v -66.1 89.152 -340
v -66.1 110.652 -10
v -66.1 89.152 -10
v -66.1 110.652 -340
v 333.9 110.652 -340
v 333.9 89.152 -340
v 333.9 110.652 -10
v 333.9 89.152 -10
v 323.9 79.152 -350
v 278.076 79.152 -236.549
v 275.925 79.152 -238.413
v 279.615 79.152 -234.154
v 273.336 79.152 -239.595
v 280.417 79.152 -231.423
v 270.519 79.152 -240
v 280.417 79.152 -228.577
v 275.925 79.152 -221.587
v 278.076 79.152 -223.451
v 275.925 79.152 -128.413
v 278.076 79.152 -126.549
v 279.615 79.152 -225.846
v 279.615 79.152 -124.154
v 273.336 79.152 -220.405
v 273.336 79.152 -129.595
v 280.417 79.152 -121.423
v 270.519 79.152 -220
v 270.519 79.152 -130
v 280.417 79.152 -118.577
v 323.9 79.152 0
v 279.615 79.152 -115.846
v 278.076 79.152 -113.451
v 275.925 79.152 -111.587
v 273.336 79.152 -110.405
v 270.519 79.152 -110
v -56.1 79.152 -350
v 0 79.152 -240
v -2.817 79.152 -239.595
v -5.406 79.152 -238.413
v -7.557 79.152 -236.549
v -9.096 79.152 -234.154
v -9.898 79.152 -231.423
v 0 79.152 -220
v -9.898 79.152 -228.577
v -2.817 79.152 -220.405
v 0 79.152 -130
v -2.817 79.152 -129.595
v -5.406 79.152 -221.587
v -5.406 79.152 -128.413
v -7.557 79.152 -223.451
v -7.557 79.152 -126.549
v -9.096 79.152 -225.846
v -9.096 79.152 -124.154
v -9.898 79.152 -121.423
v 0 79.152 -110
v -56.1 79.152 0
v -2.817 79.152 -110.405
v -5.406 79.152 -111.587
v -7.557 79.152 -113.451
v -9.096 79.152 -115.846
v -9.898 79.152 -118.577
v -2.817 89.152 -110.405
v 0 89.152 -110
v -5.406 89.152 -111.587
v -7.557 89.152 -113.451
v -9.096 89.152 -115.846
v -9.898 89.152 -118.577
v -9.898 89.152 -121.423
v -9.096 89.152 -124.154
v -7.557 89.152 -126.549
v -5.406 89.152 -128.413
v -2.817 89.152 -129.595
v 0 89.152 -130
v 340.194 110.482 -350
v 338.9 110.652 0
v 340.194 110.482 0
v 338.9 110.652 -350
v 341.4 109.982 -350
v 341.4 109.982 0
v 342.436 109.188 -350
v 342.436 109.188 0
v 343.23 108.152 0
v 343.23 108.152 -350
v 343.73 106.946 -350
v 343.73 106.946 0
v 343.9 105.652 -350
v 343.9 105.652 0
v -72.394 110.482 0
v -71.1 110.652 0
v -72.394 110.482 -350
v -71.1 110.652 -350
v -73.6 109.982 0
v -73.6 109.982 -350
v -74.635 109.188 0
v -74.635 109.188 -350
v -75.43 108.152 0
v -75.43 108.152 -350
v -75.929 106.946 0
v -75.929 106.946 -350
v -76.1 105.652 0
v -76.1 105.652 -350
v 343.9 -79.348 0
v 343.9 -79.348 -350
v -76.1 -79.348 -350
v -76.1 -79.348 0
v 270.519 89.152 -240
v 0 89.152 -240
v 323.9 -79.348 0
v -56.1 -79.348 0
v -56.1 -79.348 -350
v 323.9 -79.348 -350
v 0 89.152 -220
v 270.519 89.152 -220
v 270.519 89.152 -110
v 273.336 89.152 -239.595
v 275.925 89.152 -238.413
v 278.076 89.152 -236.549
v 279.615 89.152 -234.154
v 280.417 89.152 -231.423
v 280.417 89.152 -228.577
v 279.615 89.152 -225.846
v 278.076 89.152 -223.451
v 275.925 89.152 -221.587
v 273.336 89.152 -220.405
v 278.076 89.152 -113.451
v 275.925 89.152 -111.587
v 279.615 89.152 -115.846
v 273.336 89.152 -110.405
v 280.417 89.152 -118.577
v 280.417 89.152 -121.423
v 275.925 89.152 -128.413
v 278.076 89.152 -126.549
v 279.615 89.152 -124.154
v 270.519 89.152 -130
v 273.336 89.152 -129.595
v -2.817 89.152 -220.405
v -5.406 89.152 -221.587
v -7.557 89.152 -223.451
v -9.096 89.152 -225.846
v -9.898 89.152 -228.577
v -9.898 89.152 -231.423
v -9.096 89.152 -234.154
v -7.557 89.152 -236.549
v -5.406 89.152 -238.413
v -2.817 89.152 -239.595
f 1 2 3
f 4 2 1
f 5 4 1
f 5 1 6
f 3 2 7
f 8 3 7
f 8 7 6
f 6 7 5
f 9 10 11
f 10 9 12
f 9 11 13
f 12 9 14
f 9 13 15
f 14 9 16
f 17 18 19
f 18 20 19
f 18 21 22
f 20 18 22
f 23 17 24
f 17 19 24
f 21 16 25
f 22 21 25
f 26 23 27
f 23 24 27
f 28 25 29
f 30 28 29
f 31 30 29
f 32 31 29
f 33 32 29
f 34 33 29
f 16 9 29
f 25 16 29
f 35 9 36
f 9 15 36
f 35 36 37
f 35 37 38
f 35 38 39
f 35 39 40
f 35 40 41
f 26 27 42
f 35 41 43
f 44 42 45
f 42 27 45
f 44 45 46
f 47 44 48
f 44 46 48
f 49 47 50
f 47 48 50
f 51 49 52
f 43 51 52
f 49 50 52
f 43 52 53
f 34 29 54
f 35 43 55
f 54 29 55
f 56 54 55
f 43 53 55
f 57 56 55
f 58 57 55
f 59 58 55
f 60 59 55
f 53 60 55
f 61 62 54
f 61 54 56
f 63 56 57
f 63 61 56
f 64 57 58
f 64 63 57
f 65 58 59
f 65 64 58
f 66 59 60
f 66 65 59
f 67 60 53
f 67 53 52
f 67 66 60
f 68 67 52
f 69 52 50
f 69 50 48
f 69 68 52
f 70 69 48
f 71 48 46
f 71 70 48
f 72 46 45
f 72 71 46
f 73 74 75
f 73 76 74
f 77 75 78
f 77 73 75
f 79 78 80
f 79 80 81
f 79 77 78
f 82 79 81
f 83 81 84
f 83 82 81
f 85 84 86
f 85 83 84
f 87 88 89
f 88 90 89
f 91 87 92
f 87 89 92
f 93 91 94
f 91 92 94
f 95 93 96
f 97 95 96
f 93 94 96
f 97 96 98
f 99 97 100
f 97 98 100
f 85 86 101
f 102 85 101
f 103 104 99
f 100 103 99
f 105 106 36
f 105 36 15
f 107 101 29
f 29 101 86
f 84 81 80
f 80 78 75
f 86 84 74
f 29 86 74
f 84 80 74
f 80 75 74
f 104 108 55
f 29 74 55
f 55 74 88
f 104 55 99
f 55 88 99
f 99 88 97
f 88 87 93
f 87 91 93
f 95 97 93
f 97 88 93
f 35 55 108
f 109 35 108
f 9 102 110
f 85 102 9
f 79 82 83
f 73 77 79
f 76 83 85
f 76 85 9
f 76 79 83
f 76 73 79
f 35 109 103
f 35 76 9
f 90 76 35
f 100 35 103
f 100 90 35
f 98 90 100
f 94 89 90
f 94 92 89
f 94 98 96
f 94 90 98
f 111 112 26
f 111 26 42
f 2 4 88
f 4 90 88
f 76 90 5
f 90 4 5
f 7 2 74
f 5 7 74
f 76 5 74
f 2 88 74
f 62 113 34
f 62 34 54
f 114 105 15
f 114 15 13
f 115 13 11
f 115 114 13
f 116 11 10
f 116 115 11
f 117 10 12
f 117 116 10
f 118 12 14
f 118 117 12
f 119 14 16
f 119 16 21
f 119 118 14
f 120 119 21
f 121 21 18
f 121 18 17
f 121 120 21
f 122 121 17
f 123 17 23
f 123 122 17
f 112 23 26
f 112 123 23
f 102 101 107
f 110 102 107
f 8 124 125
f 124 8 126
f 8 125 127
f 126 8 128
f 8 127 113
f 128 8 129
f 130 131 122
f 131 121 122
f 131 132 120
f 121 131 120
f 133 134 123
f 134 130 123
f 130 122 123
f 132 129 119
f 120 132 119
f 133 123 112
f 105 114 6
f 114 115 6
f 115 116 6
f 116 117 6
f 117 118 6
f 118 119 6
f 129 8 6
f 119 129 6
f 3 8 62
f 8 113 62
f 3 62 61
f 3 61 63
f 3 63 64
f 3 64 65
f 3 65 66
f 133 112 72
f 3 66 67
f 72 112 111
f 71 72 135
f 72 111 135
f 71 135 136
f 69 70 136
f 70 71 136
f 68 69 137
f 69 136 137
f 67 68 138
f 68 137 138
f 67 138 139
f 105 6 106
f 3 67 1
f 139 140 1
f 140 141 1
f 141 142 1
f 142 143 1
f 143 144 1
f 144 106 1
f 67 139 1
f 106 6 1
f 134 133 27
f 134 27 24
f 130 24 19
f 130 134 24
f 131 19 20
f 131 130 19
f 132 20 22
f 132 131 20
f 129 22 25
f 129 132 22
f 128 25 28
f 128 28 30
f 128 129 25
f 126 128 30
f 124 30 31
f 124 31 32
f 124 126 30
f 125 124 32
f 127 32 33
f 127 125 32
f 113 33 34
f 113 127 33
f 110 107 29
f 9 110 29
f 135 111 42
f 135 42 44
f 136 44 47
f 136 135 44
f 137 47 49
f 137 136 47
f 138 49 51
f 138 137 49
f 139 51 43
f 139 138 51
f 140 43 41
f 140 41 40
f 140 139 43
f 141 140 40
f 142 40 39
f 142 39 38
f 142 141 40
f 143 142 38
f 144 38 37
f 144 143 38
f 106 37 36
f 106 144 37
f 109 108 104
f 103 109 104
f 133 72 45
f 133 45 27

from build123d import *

# Parameters (mm, degrees)
BOSS_EXTRUDE1_DEPTH  = 350
SKETCH4_W            = 400
SKETCH4_H            = 330
CUT_EXTRUDE1_DEPTH   = 21.5
SKETCH5_W            = 130
SKETCH5_H            = 130
CUT_EXTRUDE2_DEPTH   = 30
FILLET1_R            = 5
SKETCH15_W           = 130
SKETCH15_H           = 10
CUT_EXTRUDE3_DEPTH   = 25
SKETCH16_W           = 130
SKETCH16_H           = 10
BOSS_EXTRUDE6_DEPTH  = 25
SKETCH22_W           = 130
SKETCH22_H           = 130
BOSS_EXTRUDE11_DEPTH = 10
BOSS_EXTRUDE12_DEPTH = 10
CUT_EXTRUDE4_DEPTH   = 10


with BuildPart() as part:
    # Sketch3 → Boss-Extrude1 (new body)
    with BuildSketch(Plane.XY):
        Polygon((-76.099744246, 110.652173913), (343.900255754, 110.652173913), (343.900255754, -79.347826087), (323.900255754, -79.347826087), (323.900255754, 79.152173913), (-56.099744246, 79.152173913), (-56.099744246, -79.347826087), (-76.099744246, -79.347826087), align=None)
    extrude(amount=-BOSS_EXTRUDE1_DEPTH)

    # Sketch4 → Cut-Extrude1 (cut)
    with BuildSketch(Plane(origin=(0, 110.652173913, 0), x_dir=(1, 0, 0), z_dir=(0, 1, 0))):
        with Locations((133.900255754, 175)):
            Rectangle(SKETCH4_W, SKETCH4_H)
    extrude(amount=-CUT_EXTRUDE1_DEPTH, mode=Mode.SUBTRACT)

    # Sketch5 → Cut-Extrude2 (cut)
    with BuildSketch(Plane(origin=(0, 89.152173913, 0), x_dir=(1, 0, 0), z_dir=(0, 1, 0))):
        with Locations((33.900255754, 110)):
            Rectangle(SKETCH5_W, SKETCH5_H)
        with BuildLine():
            Line((-21.099744246, 247.552781264), (88.900255754, 247.552781264))
            ThreePointArc((88.900255754, 247.552781264), (98.900255754, 237.552781264), (88.900255754, 227.552781264))
            Line((88.900255754, 227.552781264), (-21.099744246, 227.552781264))
            ThreePointArc((-21.099744246, 227.552781264), (-31.099744246, 237.552781264), (-21.099744246, 247.552781264))
        make_face()
        with BuildLine():
            Line((-21.099744246, 315.266550997), (88.900255754, 315.266550997))
            ThreePointArc((88.900255754, 315.266550997), (98.900255754, 305.266550997), (88.900255754, 295.266550997))
            Line((88.900255754, 295.266550997), (-21.099744246, 295.266550997))
            ThreePointArc((-21.099744246, 295.266550997), (-31.099744246, 305.266550997), (-21.099744246, 315.266550997))
        make_face()
    extrude(amount=-CUT_EXTRUDE2_DEPTH, mode=Mode.SUBTRACT)

    # Fillet1
    fillet1_edges = [part.edges().sort_by_distance(p)[0] for p in [
        (-76.099744246, 110.652173913, -175),
        (343.900255754, 110.652173913, -175),
    ]]
    fillet(fillet1_edges, radius=FILLET1_R)

    # Sketch15 → Cut-Extrude3 (cut)
    with BuildSketch(Plane.XY.offset(-175)):
        with Locations((33.900255754, 84.152173913)):
            Rectangle(SKETCH15_W, SKETCH15_H)
    extrude(amount=-CUT_EXTRUDE3_DEPTH, mode=Mode.SUBTRACT)

    # Sketch16 → Boss-Extrude6 (add)
    with BuildSketch(Plane(origin=(0, 0, -45), x_dir=(-1, 0, 0), z_dir=(0, 0, -1))):
        with Locations((-33.900255754, 84.152173913)):
            Rectangle(SKETCH16_W, SKETCH16_H)
    extrude(amount=BOSS_EXTRUDE6_DEPTH)

    # Sketch22 → Boss-Extrude11 (add)
    with BuildSketch(Plane(origin=(0, 89.152173913, 0), x_dir=(1, 0, 0), z_dir=(0, 1, 0))):
        with Locations((33.900255754, 135)):
            Rectangle(SKETCH22_W, SKETCH22_H)
    extrude(amount=-BOSS_EXTRUDE11_DEPTH)

    # Sketch23 → Boss-Extrude12 (add)
    with BuildSketch(Plane(origin=(0, 89.152173913, 0), x_dir=(1, 0, 0), z_dir=(0, 1, 0))):
        with BuildLine():
            ThreePointArc((-21.099744246, 295.266550997), (-31.099744246, 305.266550997), (-21.099744246, 315.266550997))
            Line((-21.099744246, 315.266550997), (88.900255754, 315.266550997))
            ThreePointArc((88.900255754, 315.266550997), (98.900255754, 305.266550997), (88.900255754, 295.266550997))
            Line((88.900255754, 295.266550997), (-21.099744246, 295.266550997))
        make_face()
        with BuildLine():
            ThreePointArc((-21.099744246, 227.552781264), (-31.099744246, 237.552781264), (-21.099744246, 247.552781264))
            Line((-21.099744246, 247.552781264), (88.900255754, 247.552781264))
            ThreePointArc((88.900255754, 247.552781264), (98.900255754, 237.552781264), (88.900255754, 227.552781264))
            Line((88.900255754, 227.552781264), (-21.099744246, 227.552781264))
        make_face()
    extrude(amount=-BOSS_EXTRUDE12_DEPTH)

    # Sketch24 → Cut-Extrude4 (cut)
    with BuildSketch(Plane(origin=(0, 89.152173913, 0), x_dir=(1, 0, 0), z_dir=(0, 1, 0))):
        with BuildLine():
            Line((0, 240), (270.518831375, 240))
            ThreePointArc((270.518831375, 240), (280.518831375, 230), (270.518831375, 220))
            Line((270.518831375, 220), (0, 220))
            ThreePointArc((0, 220), (-10, 230), (0, 240))
        make_face()
        with BuildLine():
            Line((270.518831375, 110), (0, 110))
            ThreePointArc((0, 110), (-10, 120), (0, 130))
            Line((0, 130), (270.518831375, 130))
            ThreePointArc((270.518831375, 130), (280.518831375, 120), (270.518831375, 110))
        make_face()
    extrude(amount=-CUT_EXTRUDE4_DEPTH, mode=Mode.SUBTRACT)


solid = part.part
